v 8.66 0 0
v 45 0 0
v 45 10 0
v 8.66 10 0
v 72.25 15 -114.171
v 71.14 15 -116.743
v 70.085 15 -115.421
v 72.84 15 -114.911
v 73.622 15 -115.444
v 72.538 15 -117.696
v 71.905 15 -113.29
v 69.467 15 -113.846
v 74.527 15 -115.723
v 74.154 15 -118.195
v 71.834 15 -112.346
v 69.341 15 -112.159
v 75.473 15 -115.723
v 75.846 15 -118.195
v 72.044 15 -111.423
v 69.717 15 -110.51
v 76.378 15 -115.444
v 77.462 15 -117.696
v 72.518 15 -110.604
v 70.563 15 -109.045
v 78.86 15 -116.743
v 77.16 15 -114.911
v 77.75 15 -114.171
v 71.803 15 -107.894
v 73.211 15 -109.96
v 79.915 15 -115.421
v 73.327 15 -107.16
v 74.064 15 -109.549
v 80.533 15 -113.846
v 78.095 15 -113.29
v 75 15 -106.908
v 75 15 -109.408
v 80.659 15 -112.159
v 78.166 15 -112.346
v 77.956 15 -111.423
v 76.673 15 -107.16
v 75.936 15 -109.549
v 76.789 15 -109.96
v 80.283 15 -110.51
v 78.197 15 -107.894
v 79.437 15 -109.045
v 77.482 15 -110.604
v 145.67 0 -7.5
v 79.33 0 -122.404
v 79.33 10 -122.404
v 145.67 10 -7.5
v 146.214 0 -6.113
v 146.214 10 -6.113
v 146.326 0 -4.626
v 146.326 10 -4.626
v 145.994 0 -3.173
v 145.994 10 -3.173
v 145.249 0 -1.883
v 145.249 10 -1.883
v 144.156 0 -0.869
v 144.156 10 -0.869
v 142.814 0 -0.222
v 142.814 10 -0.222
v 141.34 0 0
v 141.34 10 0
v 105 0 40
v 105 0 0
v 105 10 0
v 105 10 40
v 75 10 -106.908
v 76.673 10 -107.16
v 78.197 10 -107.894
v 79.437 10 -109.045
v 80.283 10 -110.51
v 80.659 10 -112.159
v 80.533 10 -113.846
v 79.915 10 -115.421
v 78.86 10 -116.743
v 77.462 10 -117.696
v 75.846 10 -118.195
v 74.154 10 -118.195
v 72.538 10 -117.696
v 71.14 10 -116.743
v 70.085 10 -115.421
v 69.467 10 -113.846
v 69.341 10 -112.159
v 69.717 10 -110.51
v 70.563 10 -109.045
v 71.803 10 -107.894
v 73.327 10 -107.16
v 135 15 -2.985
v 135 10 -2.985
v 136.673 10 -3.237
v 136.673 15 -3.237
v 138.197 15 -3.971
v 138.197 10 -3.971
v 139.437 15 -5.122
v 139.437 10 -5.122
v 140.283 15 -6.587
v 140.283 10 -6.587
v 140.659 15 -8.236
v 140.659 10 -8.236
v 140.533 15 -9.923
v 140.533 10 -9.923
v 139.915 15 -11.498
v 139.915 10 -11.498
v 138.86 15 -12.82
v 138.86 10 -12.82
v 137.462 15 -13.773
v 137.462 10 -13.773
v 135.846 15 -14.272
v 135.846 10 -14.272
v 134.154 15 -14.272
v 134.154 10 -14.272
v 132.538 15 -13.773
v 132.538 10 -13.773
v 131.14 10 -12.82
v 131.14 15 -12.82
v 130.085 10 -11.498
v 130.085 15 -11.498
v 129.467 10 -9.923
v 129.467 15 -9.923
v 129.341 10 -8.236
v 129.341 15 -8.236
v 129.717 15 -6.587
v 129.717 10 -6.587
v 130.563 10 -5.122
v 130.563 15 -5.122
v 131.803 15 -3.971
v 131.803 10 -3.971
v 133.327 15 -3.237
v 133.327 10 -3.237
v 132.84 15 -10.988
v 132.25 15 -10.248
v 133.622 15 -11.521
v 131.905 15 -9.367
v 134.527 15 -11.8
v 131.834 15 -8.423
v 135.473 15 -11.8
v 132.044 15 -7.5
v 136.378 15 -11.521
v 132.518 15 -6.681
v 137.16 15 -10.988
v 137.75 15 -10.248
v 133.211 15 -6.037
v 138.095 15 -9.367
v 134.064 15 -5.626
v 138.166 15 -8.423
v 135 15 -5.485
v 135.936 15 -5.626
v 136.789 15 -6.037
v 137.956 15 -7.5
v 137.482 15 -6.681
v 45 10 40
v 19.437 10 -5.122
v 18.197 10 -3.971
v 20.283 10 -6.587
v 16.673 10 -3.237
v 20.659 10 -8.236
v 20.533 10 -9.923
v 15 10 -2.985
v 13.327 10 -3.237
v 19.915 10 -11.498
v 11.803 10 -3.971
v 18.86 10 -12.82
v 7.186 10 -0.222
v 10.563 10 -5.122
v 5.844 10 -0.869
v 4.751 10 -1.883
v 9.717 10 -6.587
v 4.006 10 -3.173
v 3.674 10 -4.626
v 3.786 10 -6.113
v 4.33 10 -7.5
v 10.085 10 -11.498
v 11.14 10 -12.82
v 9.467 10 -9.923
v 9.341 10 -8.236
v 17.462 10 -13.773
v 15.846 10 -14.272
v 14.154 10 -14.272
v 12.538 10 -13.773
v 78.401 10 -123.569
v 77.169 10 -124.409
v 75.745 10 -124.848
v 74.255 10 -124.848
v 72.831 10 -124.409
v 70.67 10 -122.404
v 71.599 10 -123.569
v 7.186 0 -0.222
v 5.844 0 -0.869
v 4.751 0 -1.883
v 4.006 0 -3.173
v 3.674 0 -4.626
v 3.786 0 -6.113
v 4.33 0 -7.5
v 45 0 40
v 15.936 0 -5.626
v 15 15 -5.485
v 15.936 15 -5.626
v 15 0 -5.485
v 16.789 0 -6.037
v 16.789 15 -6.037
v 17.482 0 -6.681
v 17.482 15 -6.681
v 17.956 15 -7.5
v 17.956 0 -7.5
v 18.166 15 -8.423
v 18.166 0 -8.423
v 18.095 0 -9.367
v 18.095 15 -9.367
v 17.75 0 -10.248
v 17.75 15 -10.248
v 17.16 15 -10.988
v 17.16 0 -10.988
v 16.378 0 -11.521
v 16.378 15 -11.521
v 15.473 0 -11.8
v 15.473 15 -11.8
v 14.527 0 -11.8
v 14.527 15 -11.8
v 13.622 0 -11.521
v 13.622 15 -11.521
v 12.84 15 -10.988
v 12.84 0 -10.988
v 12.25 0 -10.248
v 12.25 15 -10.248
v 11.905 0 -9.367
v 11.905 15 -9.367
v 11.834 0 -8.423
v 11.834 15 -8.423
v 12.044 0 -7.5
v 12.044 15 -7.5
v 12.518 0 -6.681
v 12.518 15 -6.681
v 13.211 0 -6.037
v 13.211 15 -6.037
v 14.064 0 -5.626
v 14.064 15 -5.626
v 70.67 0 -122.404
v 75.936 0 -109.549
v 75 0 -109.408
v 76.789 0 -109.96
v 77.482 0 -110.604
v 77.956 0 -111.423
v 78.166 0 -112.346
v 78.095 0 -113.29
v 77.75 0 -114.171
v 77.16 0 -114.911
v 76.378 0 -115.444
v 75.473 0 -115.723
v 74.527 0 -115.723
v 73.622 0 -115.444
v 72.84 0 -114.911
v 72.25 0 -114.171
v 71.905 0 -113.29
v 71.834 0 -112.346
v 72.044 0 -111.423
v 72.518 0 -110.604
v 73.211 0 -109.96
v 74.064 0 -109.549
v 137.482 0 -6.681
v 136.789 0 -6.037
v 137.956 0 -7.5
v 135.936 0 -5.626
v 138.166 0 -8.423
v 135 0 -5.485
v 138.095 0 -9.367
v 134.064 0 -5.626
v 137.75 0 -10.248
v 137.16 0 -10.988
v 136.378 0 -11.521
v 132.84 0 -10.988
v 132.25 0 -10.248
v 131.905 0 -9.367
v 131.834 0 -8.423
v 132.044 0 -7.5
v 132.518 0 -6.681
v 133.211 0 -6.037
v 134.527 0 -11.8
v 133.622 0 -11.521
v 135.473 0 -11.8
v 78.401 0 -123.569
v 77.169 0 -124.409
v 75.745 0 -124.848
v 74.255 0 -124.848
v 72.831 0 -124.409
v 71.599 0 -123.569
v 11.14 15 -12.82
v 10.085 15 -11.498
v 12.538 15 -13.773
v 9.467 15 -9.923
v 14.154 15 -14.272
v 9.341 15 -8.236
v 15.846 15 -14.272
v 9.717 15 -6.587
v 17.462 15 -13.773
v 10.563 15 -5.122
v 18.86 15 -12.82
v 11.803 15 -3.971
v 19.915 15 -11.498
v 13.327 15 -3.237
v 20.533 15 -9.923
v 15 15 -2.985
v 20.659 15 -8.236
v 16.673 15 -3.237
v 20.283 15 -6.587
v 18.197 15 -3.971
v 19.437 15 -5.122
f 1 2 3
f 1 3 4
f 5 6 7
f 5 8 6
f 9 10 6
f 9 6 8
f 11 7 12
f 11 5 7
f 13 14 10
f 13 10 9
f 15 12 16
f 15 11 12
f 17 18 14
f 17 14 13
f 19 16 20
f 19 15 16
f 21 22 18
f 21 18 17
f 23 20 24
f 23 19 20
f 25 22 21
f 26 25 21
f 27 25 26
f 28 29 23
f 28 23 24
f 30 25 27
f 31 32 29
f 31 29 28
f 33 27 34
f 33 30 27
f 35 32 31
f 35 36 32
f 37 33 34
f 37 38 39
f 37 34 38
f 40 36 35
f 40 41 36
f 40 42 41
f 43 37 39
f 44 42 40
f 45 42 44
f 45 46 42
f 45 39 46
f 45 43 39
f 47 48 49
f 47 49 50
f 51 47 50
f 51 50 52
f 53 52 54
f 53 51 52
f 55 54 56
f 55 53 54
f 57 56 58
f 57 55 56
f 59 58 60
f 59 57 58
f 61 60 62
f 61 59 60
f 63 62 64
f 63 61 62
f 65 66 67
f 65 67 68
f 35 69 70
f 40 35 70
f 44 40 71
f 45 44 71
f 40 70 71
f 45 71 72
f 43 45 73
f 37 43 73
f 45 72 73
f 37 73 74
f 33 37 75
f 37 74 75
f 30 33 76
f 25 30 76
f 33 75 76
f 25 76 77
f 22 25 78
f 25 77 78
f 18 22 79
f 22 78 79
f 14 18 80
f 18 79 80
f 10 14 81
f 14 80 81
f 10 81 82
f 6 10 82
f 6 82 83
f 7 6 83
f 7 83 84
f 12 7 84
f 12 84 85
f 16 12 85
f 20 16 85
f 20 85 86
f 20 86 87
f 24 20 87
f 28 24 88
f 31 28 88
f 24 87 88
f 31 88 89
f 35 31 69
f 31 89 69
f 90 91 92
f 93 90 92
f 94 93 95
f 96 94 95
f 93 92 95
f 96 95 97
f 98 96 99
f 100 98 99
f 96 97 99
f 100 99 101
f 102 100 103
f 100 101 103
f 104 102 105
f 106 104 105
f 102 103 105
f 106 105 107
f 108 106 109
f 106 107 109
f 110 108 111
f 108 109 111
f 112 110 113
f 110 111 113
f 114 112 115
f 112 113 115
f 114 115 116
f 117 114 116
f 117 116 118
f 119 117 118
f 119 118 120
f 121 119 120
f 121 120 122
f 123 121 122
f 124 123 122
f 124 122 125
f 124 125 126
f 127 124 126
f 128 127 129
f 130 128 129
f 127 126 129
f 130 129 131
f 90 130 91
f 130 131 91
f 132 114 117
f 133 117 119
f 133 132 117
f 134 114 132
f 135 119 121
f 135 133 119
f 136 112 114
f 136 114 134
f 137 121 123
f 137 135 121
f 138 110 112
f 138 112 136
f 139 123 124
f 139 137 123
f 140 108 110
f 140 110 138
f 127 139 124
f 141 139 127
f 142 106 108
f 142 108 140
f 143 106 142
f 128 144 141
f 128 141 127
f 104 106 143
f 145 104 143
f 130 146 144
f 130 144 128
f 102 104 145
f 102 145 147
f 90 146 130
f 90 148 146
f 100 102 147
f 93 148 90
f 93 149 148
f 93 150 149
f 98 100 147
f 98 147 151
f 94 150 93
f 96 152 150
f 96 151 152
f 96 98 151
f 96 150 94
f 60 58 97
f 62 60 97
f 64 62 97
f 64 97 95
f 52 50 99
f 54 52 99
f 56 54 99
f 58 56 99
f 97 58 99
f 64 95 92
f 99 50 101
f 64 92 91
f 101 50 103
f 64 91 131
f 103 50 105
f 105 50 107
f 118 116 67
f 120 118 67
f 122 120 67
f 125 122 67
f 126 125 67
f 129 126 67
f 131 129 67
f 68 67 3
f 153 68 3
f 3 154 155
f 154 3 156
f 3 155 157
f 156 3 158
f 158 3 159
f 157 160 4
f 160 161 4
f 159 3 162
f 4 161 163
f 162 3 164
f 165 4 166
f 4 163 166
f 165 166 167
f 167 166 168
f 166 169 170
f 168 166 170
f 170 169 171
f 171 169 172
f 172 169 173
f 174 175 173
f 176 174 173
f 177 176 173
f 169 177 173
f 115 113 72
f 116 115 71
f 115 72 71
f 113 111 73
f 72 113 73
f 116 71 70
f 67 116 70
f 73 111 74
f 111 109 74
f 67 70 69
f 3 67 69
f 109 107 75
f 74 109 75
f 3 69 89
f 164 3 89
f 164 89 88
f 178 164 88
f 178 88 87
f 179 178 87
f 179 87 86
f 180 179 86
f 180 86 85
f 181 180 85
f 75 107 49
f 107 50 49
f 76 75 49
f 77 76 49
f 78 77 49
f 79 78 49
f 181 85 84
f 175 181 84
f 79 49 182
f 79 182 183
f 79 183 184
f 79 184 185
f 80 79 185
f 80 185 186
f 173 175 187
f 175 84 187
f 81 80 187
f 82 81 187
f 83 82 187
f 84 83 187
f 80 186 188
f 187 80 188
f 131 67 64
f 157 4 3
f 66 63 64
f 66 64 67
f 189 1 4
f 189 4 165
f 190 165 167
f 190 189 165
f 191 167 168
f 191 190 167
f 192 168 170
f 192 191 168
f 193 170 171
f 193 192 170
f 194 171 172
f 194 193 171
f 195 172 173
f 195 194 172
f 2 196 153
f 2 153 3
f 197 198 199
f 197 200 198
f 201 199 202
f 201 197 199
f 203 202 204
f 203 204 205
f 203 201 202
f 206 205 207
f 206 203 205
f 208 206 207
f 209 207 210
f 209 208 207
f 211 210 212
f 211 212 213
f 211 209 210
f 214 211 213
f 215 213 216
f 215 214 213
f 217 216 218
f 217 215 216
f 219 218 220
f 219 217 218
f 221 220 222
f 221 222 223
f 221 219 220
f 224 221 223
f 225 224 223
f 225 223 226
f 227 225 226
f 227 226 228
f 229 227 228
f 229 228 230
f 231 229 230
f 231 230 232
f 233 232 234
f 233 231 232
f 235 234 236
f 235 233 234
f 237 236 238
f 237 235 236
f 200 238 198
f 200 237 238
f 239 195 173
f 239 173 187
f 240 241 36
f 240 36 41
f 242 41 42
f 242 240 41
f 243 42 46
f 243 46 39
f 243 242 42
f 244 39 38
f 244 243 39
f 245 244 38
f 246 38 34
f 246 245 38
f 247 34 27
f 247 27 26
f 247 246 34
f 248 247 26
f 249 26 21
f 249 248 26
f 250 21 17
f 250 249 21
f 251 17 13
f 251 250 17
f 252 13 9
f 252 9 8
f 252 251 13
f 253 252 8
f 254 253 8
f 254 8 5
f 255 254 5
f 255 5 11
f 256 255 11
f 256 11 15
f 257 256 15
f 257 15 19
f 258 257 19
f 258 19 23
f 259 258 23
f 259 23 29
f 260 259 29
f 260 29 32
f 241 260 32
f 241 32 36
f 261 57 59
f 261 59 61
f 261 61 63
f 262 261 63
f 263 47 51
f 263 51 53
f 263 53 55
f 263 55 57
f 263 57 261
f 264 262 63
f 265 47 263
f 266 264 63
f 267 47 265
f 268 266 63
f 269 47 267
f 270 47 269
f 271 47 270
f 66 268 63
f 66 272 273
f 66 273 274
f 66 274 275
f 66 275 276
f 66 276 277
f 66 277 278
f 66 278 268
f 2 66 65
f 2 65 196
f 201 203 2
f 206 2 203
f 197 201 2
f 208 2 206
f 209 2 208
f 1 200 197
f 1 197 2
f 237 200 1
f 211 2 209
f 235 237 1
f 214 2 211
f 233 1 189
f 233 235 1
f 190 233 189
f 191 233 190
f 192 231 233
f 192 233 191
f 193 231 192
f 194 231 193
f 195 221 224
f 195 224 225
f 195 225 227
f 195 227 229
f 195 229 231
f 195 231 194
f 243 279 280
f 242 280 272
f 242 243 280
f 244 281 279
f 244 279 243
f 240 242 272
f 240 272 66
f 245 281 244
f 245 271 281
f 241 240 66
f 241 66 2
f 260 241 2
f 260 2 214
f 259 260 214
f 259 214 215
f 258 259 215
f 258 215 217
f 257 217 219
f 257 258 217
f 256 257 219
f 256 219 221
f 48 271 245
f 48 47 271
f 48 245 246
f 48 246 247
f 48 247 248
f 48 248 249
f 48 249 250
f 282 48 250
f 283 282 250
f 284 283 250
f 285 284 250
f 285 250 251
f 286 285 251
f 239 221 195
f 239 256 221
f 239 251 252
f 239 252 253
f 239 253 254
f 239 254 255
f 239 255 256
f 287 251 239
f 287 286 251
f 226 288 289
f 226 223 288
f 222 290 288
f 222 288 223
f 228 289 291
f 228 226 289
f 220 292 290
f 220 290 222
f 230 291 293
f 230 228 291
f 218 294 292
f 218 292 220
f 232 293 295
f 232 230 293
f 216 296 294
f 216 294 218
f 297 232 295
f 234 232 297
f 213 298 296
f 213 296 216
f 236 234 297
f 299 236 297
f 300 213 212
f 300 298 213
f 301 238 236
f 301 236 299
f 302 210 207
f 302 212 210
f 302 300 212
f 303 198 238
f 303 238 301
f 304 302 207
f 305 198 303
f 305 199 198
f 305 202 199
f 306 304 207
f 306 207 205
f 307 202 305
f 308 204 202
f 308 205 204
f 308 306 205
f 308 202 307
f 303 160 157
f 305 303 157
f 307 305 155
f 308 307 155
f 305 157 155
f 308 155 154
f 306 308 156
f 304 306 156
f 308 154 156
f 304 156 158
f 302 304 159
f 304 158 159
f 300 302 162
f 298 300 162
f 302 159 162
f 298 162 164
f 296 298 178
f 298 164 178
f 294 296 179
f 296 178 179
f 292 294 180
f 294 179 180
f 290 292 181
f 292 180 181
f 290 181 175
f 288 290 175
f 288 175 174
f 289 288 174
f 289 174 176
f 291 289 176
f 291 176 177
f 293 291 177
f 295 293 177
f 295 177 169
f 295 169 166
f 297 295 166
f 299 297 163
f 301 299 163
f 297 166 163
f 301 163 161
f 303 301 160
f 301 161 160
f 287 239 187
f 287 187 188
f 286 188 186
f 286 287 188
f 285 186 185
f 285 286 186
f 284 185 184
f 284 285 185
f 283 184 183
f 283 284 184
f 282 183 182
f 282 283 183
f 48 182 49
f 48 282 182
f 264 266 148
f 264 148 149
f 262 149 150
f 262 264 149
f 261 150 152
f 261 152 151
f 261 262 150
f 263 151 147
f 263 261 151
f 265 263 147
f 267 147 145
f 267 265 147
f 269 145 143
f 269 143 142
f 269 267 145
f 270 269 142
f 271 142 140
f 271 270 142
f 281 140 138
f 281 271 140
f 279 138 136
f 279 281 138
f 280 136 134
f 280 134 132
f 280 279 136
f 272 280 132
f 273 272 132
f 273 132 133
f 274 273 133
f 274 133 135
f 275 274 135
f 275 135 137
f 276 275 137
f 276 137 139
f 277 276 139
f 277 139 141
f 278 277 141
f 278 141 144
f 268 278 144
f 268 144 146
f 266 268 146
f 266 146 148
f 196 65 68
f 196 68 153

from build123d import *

# Parameters (mm, degrees)
SKETCH1_R           = 3.175
BOSS_EXTRUDE5_DEPTH = 10
SKETCH7_R           = 5.675
SKETCH7_R_2         = 3.175
BOSS_EXTRUDE7_DEPTH = 5


with BuildPart() as part:
    # Sketch1 → Boss-Extrude5 (new body)
    with BuildSketch(Plane(origin=(0, 0, 0), x_dir=(1, 0, 0), z_dir=(0, 1, 0))):
        with BuildLine():
            Line((4.330127019, 7.5), (70.669872981, 122.403810568))
            ThreePointArc((70.669872981, 122.403810568), (75, 124.903810568), (79.330127019, 122.403810568))
            Line((79.330127019, 122.403810568), (145.669872981, 7.5))
            ThreePointArc((145.669872981, 7.5), (145.669873, 2.500000033), (141.339746038, 0))
            Line((141.339746038, 0), (105.000000038, 0))
            Line((105.000000038, 0), (105.000000038, -40))
            Line((105.000000038, -40), (45.000000038, -40))
            Line((45.000000038, -40), (45.000000038, 0))
            Line((45.000000038, 0), (8.660254038, 0))
            ThreePointArc((8.660254038, 0), (4.330127019, 2.5), (4.330127019, 7.5))
        make_face()
        with Locations(Location((75, 112.583302492, 0), (0, 0, 270))):
            Circle(SKETCH1_R, mode=Mode.SUBTRACT)
        with Locations(Location((15, 8.660254038, 0), (0, 0, 270))):
            Circle(SKETCH1_R, mode=Mode.SUBTRACT)
        with Locations(Location((135, 8.660254038, 0), (0, 0, 270))):
            Circle(SKETCH1_R, mode=Mode.SUBTRACT)
    extrude(amount=BOSS_EXTRUDE5_DEPTH)

    # Sketch7 → Boss-Extrude7 (add)
    # profile 1 of 3: a face of its own
    with BuildSketch(Plane(origin=(0, 10, 0), x_dir=(1, 0, 0), z_dir=(0, 1, 0))):
        with Locations(Location((15, 8.660254038, 0), (0, 0, 270))):
            Circle(SKETCH7_R)
        with Locations(Location((15, 8.660254038, 0), (0, 0, 270))):
            Circle(SKETCH7_R_2, mode=Mode.SUBTRACT)
    # profile 2 of 3: a face of its own
    with BuildSketch(Plane(origin=(0, 10, 0), x_dir=(1, 0, 0), z_dir=(0, 1, 0))):
        with Locations(Location((135, 8.660254038, 0), (0, 0, 270))):
            Circle(SKETCH7_R)
        with Locations(Location((135, 8.660254038, 0), (0, 0, 270))):
            Circle(SKETCH7_R_2, mode=Mode.SUBTRACT)
    # profile 3 of 3: a face of its own
    with BuildSketch(Plane(origin=(0, 10, 0), x_dir=(1, 0, 0), z_dir=(0, 1, 0))):
        with Locations(Location((75, 112.583302492, 0), (0, 0, 270))):
            Circle(SKETCH7_R)
        with Locations(Location((75, 112.583302492, 0), (0, 0, 270))):
            Circle(SKETCH7_R_2, mode=Mode.SUBTRACT)
    extrude(amount=BOSS_EXTRUDE7_DEPTH)


solid = part.part
